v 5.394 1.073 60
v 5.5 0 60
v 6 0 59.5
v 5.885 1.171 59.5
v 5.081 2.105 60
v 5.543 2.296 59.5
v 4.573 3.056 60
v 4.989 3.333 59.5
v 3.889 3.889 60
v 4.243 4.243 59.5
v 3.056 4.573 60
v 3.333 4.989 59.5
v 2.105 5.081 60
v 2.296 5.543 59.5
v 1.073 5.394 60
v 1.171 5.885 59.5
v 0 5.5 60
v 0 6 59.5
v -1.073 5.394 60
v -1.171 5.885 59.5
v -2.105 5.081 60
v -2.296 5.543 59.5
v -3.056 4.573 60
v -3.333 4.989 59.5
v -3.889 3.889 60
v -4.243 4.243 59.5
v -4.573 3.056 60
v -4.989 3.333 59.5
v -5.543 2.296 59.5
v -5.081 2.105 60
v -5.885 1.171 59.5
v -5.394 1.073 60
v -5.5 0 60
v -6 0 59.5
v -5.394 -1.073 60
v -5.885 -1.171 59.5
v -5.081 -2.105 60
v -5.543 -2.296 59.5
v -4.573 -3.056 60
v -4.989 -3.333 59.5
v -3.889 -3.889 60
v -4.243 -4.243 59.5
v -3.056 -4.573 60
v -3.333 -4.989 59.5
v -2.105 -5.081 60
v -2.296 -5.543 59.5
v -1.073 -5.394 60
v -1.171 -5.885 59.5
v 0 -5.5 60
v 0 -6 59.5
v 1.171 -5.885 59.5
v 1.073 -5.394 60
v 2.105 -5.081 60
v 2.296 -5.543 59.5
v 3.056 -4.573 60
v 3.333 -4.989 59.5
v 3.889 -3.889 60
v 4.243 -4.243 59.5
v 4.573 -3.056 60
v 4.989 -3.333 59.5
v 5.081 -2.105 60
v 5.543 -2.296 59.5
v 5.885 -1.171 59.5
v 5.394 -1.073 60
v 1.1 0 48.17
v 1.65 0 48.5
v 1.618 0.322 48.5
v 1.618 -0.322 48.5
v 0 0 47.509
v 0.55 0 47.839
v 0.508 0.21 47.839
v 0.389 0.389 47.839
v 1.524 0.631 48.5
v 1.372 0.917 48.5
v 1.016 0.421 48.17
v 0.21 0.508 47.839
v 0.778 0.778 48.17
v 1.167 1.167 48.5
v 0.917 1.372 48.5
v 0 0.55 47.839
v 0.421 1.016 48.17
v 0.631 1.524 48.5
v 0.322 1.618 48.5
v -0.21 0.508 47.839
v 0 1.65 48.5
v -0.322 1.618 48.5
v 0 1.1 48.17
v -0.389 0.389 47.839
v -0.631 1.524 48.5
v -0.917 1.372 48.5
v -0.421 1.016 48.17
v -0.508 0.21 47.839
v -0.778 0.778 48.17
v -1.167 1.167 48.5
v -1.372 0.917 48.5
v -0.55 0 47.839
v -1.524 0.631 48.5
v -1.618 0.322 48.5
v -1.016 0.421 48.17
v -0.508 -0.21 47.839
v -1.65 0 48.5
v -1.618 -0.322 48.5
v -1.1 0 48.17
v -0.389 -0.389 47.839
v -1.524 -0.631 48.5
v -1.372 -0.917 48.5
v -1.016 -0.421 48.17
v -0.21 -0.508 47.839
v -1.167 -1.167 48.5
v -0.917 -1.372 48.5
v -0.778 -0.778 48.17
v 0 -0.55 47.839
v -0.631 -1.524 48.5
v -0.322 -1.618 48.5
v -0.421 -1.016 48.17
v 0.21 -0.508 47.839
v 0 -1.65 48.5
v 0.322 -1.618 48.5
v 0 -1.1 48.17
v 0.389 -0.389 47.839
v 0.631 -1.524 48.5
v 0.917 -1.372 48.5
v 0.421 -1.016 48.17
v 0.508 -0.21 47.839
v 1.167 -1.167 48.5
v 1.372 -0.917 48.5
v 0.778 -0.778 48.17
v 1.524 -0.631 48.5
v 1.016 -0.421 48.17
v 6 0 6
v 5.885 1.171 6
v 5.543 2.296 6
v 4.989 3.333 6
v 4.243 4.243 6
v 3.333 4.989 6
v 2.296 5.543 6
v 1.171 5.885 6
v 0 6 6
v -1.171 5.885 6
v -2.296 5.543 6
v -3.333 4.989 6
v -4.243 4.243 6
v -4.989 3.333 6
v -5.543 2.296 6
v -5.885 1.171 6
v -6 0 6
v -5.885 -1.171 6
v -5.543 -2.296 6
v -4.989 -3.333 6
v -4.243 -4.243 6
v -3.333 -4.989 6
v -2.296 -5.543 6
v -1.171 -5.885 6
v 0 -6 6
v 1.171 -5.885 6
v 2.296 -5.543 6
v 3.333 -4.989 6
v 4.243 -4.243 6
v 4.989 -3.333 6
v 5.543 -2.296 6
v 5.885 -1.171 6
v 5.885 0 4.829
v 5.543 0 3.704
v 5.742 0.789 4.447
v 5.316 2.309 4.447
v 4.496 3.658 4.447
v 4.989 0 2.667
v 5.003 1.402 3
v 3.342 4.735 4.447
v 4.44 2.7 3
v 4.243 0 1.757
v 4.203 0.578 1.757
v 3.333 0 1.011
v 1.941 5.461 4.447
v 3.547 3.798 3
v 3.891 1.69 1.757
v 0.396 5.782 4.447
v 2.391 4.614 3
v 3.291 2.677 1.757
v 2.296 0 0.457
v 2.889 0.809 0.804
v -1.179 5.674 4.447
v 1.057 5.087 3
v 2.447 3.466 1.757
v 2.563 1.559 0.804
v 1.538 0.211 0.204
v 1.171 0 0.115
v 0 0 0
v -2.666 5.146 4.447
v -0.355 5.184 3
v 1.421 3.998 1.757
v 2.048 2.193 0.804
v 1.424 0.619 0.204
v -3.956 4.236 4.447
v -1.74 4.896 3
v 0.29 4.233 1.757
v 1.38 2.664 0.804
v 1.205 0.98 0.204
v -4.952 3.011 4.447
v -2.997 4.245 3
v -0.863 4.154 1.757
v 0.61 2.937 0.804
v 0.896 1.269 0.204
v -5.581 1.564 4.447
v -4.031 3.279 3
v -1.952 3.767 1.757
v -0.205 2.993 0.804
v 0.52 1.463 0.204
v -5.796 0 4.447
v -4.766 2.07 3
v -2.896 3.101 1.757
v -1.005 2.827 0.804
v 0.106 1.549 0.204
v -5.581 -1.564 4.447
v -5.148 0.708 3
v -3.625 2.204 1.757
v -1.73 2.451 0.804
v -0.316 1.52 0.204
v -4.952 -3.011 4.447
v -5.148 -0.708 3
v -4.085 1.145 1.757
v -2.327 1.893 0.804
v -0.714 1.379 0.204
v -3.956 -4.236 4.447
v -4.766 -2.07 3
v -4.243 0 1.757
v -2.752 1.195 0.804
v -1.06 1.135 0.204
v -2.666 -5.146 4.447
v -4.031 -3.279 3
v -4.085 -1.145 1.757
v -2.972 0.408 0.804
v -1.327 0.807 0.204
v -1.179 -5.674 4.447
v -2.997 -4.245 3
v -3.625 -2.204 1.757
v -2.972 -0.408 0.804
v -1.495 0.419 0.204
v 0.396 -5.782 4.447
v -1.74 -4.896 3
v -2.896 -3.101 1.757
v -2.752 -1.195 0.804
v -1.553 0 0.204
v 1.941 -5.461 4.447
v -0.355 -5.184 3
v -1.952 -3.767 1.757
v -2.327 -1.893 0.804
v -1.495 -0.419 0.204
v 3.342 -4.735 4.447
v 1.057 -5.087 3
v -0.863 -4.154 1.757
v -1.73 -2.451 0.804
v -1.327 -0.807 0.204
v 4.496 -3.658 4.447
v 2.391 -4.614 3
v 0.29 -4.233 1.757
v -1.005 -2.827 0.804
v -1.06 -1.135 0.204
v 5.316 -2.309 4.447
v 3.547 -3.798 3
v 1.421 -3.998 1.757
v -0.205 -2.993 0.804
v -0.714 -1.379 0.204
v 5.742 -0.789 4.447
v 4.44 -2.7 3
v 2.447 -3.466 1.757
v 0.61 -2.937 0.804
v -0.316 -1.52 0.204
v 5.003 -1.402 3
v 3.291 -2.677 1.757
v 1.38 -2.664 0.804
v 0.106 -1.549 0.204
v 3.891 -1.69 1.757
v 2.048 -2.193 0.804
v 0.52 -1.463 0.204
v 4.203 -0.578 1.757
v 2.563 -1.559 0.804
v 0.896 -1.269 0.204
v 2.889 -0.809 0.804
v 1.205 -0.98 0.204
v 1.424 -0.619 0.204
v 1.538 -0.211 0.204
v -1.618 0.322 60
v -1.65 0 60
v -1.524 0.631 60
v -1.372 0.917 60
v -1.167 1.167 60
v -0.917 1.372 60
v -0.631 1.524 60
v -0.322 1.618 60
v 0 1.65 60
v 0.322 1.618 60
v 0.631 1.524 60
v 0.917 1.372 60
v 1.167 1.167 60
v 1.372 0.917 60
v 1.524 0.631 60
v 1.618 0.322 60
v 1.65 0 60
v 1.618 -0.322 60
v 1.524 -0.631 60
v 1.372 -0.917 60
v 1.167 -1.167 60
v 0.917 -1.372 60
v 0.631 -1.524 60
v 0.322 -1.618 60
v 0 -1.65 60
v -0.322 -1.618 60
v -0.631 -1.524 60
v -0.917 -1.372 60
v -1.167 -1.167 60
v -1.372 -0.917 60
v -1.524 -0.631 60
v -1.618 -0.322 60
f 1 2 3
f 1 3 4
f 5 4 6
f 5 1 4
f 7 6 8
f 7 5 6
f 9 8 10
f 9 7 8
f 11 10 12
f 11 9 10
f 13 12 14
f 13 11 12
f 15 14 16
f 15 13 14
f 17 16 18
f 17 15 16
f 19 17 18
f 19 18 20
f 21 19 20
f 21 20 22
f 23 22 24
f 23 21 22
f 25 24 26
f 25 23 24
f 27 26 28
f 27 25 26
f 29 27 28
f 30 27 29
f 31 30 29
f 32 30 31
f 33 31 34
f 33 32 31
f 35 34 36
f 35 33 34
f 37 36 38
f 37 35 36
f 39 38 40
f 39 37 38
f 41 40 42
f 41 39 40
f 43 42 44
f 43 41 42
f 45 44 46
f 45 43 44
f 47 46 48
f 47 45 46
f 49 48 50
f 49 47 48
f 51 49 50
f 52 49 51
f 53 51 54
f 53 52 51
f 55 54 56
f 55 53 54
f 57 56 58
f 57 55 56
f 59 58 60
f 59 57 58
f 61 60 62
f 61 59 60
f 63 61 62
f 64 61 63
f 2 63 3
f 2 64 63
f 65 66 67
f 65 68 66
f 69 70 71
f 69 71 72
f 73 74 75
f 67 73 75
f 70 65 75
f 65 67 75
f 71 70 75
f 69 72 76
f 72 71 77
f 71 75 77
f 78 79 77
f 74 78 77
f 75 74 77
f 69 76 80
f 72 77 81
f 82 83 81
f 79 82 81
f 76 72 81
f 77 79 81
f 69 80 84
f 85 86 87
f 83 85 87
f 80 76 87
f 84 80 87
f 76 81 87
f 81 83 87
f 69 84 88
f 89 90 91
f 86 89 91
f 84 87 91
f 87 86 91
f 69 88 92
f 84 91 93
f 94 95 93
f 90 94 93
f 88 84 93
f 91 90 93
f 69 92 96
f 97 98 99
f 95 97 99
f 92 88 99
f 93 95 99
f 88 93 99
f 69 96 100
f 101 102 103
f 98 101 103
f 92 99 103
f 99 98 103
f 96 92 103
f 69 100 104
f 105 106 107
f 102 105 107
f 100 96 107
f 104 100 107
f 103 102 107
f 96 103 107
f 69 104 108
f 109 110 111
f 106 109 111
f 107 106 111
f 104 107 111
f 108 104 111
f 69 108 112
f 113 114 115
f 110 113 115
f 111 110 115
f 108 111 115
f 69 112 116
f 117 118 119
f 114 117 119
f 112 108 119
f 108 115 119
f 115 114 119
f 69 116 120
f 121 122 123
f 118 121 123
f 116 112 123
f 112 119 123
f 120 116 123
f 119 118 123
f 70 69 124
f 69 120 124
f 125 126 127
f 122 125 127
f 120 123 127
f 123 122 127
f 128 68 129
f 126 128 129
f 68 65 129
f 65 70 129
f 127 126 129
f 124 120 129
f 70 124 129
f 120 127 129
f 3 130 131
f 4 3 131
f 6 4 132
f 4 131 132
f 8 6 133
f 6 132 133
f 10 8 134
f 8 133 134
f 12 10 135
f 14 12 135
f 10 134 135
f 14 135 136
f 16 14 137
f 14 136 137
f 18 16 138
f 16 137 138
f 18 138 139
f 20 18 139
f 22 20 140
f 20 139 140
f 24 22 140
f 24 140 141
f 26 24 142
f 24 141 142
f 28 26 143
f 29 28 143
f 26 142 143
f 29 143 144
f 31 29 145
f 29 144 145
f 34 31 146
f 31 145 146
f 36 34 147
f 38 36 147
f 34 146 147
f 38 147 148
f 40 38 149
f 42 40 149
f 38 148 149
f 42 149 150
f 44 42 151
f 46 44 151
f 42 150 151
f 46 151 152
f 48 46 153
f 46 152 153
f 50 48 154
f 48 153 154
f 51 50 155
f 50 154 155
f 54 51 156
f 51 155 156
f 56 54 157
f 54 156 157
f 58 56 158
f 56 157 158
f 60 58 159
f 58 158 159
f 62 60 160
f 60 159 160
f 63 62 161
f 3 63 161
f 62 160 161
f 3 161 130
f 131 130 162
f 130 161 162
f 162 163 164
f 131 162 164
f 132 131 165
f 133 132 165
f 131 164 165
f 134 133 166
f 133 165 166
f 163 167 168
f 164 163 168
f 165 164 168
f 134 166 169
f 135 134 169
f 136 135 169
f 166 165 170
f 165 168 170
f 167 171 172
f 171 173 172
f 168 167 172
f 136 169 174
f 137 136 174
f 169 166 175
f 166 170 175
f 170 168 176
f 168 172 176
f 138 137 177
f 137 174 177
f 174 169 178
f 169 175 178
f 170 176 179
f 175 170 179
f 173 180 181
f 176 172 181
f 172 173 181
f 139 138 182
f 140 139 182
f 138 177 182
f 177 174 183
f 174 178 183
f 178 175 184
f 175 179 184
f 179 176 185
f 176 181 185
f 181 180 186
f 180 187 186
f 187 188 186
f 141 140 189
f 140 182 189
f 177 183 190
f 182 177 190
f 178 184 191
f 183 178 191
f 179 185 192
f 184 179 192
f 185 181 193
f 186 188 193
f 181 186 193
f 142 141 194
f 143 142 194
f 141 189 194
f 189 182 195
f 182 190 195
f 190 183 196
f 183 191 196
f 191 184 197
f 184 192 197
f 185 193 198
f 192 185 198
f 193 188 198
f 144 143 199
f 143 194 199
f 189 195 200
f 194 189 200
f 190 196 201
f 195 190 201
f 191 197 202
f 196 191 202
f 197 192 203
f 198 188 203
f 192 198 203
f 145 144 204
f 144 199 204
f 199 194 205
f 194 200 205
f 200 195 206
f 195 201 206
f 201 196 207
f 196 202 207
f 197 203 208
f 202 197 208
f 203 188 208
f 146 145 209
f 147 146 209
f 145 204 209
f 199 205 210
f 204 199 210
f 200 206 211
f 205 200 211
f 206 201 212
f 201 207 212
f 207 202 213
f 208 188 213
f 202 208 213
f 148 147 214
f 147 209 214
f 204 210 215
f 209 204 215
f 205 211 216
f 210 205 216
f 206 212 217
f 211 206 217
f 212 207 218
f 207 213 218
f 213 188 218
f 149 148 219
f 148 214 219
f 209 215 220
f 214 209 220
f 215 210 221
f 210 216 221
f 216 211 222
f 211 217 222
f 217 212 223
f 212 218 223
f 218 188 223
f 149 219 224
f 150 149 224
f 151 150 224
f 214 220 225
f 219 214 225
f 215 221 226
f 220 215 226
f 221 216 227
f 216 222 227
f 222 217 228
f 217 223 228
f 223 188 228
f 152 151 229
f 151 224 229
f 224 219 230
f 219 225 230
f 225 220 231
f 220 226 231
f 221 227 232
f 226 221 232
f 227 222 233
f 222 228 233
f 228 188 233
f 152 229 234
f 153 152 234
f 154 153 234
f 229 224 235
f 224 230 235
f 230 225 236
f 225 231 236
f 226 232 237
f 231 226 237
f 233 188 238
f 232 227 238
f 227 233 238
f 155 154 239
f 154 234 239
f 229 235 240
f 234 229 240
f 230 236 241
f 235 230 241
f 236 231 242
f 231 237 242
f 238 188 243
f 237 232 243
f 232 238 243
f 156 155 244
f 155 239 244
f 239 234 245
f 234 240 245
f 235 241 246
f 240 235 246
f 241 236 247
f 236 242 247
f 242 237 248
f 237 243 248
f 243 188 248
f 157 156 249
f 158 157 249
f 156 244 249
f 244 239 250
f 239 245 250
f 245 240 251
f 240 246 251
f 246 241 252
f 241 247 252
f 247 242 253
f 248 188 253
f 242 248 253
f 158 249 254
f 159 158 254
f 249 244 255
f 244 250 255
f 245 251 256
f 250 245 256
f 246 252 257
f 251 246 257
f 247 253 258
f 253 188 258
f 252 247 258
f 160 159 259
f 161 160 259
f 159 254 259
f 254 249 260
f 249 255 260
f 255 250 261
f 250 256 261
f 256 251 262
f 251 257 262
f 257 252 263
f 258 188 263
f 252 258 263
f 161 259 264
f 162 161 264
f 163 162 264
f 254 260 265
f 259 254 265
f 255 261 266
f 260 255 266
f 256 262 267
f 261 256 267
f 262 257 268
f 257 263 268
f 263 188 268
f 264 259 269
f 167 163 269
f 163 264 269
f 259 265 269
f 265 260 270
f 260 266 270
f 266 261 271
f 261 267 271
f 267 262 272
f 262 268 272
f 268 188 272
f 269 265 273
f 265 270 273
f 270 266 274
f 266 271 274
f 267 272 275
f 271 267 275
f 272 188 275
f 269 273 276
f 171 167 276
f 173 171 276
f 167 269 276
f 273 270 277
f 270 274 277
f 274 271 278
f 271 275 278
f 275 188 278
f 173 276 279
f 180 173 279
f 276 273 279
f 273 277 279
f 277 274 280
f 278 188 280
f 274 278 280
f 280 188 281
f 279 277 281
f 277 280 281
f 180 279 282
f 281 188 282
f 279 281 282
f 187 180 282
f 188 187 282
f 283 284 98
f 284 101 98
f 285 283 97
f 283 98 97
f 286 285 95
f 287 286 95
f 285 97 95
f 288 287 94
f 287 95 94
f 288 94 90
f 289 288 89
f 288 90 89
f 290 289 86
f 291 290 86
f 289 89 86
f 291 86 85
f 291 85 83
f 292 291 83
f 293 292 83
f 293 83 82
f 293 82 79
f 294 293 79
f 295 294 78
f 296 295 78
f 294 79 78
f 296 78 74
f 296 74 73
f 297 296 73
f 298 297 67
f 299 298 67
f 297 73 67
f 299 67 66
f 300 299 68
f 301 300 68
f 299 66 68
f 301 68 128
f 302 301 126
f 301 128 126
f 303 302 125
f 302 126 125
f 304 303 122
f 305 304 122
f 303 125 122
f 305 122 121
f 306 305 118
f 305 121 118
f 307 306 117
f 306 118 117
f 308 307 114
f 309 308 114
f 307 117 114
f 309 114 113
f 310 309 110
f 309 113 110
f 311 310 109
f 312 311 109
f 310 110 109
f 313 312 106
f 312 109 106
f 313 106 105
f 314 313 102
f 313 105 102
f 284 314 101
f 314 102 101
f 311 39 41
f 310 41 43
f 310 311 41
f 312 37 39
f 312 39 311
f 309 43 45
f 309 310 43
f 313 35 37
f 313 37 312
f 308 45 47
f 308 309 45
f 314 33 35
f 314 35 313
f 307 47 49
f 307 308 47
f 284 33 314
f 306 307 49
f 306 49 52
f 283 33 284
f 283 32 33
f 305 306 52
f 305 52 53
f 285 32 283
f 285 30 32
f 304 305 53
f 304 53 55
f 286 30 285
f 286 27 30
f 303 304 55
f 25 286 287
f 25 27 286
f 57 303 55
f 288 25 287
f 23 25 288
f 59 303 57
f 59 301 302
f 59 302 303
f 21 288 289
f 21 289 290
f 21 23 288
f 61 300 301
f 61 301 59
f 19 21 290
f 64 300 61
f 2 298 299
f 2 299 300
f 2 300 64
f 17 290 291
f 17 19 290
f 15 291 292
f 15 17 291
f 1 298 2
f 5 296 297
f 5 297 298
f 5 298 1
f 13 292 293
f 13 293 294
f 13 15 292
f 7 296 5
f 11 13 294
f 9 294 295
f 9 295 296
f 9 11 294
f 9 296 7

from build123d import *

# Parameters (mm, degrees)
SKETCH_1_R             = 6
EXTRUDE_1_DEPTH        = 60
FILLET_1_R             = 6
CHAMFER_1_SIZE         = 0.5
HOLE_WIZARD_M4_1_D     = 3.3
HOLE_WIZARD_M4_1_DEPTH = 11.5
HOLE_WIZARD_M4_1_TIP   = 0.991420021


with BuildPart() as part:
    # 草圖1 → 伸長1 (new body)
    with BuildSketch(Plane.XY):
        Circle(SKETCH_1_R)
    extrude(amount=EXTRUDE_1_DEPTH)

    # 圓角1
    fillet_1_edges = [part.edges().sort_by_distance(p)[0] for p in [
        (-6, 0, 0),
    ]]
    fillet(fillet_1_edges, radius=FILLET_1_R)

    # 導角1
    chamfer_1_edges = [part.edges().sort_by_distance(p)[0] for p in [
        (-6, 0, 60),
    ]]
    chamfer(chamfer_1_edges, length=CHAMFER_1_SIZE)

    # M4 螺紋孔1
    with Locations(Plane.XY.offset(60)):
        with Locations((0, 0)):
            Hole(HOLE_WIZARD_M4_1_D / 2, depth=HOLE_WIZARD_M4_1_DEPTH)
            with Locations((0, 0, -(HOLE_WIZARD_M4_1_DEPTH + HOLE_WIZARD_M4_1_TIP / 2))):  # 118° drill point
                Cone(0, HOLE_WIZARD_M4_1_D / 2, HOLE_WIZARD_M4_1_TIP, mode=Mode.SUBTRACT)


solid = part.part
